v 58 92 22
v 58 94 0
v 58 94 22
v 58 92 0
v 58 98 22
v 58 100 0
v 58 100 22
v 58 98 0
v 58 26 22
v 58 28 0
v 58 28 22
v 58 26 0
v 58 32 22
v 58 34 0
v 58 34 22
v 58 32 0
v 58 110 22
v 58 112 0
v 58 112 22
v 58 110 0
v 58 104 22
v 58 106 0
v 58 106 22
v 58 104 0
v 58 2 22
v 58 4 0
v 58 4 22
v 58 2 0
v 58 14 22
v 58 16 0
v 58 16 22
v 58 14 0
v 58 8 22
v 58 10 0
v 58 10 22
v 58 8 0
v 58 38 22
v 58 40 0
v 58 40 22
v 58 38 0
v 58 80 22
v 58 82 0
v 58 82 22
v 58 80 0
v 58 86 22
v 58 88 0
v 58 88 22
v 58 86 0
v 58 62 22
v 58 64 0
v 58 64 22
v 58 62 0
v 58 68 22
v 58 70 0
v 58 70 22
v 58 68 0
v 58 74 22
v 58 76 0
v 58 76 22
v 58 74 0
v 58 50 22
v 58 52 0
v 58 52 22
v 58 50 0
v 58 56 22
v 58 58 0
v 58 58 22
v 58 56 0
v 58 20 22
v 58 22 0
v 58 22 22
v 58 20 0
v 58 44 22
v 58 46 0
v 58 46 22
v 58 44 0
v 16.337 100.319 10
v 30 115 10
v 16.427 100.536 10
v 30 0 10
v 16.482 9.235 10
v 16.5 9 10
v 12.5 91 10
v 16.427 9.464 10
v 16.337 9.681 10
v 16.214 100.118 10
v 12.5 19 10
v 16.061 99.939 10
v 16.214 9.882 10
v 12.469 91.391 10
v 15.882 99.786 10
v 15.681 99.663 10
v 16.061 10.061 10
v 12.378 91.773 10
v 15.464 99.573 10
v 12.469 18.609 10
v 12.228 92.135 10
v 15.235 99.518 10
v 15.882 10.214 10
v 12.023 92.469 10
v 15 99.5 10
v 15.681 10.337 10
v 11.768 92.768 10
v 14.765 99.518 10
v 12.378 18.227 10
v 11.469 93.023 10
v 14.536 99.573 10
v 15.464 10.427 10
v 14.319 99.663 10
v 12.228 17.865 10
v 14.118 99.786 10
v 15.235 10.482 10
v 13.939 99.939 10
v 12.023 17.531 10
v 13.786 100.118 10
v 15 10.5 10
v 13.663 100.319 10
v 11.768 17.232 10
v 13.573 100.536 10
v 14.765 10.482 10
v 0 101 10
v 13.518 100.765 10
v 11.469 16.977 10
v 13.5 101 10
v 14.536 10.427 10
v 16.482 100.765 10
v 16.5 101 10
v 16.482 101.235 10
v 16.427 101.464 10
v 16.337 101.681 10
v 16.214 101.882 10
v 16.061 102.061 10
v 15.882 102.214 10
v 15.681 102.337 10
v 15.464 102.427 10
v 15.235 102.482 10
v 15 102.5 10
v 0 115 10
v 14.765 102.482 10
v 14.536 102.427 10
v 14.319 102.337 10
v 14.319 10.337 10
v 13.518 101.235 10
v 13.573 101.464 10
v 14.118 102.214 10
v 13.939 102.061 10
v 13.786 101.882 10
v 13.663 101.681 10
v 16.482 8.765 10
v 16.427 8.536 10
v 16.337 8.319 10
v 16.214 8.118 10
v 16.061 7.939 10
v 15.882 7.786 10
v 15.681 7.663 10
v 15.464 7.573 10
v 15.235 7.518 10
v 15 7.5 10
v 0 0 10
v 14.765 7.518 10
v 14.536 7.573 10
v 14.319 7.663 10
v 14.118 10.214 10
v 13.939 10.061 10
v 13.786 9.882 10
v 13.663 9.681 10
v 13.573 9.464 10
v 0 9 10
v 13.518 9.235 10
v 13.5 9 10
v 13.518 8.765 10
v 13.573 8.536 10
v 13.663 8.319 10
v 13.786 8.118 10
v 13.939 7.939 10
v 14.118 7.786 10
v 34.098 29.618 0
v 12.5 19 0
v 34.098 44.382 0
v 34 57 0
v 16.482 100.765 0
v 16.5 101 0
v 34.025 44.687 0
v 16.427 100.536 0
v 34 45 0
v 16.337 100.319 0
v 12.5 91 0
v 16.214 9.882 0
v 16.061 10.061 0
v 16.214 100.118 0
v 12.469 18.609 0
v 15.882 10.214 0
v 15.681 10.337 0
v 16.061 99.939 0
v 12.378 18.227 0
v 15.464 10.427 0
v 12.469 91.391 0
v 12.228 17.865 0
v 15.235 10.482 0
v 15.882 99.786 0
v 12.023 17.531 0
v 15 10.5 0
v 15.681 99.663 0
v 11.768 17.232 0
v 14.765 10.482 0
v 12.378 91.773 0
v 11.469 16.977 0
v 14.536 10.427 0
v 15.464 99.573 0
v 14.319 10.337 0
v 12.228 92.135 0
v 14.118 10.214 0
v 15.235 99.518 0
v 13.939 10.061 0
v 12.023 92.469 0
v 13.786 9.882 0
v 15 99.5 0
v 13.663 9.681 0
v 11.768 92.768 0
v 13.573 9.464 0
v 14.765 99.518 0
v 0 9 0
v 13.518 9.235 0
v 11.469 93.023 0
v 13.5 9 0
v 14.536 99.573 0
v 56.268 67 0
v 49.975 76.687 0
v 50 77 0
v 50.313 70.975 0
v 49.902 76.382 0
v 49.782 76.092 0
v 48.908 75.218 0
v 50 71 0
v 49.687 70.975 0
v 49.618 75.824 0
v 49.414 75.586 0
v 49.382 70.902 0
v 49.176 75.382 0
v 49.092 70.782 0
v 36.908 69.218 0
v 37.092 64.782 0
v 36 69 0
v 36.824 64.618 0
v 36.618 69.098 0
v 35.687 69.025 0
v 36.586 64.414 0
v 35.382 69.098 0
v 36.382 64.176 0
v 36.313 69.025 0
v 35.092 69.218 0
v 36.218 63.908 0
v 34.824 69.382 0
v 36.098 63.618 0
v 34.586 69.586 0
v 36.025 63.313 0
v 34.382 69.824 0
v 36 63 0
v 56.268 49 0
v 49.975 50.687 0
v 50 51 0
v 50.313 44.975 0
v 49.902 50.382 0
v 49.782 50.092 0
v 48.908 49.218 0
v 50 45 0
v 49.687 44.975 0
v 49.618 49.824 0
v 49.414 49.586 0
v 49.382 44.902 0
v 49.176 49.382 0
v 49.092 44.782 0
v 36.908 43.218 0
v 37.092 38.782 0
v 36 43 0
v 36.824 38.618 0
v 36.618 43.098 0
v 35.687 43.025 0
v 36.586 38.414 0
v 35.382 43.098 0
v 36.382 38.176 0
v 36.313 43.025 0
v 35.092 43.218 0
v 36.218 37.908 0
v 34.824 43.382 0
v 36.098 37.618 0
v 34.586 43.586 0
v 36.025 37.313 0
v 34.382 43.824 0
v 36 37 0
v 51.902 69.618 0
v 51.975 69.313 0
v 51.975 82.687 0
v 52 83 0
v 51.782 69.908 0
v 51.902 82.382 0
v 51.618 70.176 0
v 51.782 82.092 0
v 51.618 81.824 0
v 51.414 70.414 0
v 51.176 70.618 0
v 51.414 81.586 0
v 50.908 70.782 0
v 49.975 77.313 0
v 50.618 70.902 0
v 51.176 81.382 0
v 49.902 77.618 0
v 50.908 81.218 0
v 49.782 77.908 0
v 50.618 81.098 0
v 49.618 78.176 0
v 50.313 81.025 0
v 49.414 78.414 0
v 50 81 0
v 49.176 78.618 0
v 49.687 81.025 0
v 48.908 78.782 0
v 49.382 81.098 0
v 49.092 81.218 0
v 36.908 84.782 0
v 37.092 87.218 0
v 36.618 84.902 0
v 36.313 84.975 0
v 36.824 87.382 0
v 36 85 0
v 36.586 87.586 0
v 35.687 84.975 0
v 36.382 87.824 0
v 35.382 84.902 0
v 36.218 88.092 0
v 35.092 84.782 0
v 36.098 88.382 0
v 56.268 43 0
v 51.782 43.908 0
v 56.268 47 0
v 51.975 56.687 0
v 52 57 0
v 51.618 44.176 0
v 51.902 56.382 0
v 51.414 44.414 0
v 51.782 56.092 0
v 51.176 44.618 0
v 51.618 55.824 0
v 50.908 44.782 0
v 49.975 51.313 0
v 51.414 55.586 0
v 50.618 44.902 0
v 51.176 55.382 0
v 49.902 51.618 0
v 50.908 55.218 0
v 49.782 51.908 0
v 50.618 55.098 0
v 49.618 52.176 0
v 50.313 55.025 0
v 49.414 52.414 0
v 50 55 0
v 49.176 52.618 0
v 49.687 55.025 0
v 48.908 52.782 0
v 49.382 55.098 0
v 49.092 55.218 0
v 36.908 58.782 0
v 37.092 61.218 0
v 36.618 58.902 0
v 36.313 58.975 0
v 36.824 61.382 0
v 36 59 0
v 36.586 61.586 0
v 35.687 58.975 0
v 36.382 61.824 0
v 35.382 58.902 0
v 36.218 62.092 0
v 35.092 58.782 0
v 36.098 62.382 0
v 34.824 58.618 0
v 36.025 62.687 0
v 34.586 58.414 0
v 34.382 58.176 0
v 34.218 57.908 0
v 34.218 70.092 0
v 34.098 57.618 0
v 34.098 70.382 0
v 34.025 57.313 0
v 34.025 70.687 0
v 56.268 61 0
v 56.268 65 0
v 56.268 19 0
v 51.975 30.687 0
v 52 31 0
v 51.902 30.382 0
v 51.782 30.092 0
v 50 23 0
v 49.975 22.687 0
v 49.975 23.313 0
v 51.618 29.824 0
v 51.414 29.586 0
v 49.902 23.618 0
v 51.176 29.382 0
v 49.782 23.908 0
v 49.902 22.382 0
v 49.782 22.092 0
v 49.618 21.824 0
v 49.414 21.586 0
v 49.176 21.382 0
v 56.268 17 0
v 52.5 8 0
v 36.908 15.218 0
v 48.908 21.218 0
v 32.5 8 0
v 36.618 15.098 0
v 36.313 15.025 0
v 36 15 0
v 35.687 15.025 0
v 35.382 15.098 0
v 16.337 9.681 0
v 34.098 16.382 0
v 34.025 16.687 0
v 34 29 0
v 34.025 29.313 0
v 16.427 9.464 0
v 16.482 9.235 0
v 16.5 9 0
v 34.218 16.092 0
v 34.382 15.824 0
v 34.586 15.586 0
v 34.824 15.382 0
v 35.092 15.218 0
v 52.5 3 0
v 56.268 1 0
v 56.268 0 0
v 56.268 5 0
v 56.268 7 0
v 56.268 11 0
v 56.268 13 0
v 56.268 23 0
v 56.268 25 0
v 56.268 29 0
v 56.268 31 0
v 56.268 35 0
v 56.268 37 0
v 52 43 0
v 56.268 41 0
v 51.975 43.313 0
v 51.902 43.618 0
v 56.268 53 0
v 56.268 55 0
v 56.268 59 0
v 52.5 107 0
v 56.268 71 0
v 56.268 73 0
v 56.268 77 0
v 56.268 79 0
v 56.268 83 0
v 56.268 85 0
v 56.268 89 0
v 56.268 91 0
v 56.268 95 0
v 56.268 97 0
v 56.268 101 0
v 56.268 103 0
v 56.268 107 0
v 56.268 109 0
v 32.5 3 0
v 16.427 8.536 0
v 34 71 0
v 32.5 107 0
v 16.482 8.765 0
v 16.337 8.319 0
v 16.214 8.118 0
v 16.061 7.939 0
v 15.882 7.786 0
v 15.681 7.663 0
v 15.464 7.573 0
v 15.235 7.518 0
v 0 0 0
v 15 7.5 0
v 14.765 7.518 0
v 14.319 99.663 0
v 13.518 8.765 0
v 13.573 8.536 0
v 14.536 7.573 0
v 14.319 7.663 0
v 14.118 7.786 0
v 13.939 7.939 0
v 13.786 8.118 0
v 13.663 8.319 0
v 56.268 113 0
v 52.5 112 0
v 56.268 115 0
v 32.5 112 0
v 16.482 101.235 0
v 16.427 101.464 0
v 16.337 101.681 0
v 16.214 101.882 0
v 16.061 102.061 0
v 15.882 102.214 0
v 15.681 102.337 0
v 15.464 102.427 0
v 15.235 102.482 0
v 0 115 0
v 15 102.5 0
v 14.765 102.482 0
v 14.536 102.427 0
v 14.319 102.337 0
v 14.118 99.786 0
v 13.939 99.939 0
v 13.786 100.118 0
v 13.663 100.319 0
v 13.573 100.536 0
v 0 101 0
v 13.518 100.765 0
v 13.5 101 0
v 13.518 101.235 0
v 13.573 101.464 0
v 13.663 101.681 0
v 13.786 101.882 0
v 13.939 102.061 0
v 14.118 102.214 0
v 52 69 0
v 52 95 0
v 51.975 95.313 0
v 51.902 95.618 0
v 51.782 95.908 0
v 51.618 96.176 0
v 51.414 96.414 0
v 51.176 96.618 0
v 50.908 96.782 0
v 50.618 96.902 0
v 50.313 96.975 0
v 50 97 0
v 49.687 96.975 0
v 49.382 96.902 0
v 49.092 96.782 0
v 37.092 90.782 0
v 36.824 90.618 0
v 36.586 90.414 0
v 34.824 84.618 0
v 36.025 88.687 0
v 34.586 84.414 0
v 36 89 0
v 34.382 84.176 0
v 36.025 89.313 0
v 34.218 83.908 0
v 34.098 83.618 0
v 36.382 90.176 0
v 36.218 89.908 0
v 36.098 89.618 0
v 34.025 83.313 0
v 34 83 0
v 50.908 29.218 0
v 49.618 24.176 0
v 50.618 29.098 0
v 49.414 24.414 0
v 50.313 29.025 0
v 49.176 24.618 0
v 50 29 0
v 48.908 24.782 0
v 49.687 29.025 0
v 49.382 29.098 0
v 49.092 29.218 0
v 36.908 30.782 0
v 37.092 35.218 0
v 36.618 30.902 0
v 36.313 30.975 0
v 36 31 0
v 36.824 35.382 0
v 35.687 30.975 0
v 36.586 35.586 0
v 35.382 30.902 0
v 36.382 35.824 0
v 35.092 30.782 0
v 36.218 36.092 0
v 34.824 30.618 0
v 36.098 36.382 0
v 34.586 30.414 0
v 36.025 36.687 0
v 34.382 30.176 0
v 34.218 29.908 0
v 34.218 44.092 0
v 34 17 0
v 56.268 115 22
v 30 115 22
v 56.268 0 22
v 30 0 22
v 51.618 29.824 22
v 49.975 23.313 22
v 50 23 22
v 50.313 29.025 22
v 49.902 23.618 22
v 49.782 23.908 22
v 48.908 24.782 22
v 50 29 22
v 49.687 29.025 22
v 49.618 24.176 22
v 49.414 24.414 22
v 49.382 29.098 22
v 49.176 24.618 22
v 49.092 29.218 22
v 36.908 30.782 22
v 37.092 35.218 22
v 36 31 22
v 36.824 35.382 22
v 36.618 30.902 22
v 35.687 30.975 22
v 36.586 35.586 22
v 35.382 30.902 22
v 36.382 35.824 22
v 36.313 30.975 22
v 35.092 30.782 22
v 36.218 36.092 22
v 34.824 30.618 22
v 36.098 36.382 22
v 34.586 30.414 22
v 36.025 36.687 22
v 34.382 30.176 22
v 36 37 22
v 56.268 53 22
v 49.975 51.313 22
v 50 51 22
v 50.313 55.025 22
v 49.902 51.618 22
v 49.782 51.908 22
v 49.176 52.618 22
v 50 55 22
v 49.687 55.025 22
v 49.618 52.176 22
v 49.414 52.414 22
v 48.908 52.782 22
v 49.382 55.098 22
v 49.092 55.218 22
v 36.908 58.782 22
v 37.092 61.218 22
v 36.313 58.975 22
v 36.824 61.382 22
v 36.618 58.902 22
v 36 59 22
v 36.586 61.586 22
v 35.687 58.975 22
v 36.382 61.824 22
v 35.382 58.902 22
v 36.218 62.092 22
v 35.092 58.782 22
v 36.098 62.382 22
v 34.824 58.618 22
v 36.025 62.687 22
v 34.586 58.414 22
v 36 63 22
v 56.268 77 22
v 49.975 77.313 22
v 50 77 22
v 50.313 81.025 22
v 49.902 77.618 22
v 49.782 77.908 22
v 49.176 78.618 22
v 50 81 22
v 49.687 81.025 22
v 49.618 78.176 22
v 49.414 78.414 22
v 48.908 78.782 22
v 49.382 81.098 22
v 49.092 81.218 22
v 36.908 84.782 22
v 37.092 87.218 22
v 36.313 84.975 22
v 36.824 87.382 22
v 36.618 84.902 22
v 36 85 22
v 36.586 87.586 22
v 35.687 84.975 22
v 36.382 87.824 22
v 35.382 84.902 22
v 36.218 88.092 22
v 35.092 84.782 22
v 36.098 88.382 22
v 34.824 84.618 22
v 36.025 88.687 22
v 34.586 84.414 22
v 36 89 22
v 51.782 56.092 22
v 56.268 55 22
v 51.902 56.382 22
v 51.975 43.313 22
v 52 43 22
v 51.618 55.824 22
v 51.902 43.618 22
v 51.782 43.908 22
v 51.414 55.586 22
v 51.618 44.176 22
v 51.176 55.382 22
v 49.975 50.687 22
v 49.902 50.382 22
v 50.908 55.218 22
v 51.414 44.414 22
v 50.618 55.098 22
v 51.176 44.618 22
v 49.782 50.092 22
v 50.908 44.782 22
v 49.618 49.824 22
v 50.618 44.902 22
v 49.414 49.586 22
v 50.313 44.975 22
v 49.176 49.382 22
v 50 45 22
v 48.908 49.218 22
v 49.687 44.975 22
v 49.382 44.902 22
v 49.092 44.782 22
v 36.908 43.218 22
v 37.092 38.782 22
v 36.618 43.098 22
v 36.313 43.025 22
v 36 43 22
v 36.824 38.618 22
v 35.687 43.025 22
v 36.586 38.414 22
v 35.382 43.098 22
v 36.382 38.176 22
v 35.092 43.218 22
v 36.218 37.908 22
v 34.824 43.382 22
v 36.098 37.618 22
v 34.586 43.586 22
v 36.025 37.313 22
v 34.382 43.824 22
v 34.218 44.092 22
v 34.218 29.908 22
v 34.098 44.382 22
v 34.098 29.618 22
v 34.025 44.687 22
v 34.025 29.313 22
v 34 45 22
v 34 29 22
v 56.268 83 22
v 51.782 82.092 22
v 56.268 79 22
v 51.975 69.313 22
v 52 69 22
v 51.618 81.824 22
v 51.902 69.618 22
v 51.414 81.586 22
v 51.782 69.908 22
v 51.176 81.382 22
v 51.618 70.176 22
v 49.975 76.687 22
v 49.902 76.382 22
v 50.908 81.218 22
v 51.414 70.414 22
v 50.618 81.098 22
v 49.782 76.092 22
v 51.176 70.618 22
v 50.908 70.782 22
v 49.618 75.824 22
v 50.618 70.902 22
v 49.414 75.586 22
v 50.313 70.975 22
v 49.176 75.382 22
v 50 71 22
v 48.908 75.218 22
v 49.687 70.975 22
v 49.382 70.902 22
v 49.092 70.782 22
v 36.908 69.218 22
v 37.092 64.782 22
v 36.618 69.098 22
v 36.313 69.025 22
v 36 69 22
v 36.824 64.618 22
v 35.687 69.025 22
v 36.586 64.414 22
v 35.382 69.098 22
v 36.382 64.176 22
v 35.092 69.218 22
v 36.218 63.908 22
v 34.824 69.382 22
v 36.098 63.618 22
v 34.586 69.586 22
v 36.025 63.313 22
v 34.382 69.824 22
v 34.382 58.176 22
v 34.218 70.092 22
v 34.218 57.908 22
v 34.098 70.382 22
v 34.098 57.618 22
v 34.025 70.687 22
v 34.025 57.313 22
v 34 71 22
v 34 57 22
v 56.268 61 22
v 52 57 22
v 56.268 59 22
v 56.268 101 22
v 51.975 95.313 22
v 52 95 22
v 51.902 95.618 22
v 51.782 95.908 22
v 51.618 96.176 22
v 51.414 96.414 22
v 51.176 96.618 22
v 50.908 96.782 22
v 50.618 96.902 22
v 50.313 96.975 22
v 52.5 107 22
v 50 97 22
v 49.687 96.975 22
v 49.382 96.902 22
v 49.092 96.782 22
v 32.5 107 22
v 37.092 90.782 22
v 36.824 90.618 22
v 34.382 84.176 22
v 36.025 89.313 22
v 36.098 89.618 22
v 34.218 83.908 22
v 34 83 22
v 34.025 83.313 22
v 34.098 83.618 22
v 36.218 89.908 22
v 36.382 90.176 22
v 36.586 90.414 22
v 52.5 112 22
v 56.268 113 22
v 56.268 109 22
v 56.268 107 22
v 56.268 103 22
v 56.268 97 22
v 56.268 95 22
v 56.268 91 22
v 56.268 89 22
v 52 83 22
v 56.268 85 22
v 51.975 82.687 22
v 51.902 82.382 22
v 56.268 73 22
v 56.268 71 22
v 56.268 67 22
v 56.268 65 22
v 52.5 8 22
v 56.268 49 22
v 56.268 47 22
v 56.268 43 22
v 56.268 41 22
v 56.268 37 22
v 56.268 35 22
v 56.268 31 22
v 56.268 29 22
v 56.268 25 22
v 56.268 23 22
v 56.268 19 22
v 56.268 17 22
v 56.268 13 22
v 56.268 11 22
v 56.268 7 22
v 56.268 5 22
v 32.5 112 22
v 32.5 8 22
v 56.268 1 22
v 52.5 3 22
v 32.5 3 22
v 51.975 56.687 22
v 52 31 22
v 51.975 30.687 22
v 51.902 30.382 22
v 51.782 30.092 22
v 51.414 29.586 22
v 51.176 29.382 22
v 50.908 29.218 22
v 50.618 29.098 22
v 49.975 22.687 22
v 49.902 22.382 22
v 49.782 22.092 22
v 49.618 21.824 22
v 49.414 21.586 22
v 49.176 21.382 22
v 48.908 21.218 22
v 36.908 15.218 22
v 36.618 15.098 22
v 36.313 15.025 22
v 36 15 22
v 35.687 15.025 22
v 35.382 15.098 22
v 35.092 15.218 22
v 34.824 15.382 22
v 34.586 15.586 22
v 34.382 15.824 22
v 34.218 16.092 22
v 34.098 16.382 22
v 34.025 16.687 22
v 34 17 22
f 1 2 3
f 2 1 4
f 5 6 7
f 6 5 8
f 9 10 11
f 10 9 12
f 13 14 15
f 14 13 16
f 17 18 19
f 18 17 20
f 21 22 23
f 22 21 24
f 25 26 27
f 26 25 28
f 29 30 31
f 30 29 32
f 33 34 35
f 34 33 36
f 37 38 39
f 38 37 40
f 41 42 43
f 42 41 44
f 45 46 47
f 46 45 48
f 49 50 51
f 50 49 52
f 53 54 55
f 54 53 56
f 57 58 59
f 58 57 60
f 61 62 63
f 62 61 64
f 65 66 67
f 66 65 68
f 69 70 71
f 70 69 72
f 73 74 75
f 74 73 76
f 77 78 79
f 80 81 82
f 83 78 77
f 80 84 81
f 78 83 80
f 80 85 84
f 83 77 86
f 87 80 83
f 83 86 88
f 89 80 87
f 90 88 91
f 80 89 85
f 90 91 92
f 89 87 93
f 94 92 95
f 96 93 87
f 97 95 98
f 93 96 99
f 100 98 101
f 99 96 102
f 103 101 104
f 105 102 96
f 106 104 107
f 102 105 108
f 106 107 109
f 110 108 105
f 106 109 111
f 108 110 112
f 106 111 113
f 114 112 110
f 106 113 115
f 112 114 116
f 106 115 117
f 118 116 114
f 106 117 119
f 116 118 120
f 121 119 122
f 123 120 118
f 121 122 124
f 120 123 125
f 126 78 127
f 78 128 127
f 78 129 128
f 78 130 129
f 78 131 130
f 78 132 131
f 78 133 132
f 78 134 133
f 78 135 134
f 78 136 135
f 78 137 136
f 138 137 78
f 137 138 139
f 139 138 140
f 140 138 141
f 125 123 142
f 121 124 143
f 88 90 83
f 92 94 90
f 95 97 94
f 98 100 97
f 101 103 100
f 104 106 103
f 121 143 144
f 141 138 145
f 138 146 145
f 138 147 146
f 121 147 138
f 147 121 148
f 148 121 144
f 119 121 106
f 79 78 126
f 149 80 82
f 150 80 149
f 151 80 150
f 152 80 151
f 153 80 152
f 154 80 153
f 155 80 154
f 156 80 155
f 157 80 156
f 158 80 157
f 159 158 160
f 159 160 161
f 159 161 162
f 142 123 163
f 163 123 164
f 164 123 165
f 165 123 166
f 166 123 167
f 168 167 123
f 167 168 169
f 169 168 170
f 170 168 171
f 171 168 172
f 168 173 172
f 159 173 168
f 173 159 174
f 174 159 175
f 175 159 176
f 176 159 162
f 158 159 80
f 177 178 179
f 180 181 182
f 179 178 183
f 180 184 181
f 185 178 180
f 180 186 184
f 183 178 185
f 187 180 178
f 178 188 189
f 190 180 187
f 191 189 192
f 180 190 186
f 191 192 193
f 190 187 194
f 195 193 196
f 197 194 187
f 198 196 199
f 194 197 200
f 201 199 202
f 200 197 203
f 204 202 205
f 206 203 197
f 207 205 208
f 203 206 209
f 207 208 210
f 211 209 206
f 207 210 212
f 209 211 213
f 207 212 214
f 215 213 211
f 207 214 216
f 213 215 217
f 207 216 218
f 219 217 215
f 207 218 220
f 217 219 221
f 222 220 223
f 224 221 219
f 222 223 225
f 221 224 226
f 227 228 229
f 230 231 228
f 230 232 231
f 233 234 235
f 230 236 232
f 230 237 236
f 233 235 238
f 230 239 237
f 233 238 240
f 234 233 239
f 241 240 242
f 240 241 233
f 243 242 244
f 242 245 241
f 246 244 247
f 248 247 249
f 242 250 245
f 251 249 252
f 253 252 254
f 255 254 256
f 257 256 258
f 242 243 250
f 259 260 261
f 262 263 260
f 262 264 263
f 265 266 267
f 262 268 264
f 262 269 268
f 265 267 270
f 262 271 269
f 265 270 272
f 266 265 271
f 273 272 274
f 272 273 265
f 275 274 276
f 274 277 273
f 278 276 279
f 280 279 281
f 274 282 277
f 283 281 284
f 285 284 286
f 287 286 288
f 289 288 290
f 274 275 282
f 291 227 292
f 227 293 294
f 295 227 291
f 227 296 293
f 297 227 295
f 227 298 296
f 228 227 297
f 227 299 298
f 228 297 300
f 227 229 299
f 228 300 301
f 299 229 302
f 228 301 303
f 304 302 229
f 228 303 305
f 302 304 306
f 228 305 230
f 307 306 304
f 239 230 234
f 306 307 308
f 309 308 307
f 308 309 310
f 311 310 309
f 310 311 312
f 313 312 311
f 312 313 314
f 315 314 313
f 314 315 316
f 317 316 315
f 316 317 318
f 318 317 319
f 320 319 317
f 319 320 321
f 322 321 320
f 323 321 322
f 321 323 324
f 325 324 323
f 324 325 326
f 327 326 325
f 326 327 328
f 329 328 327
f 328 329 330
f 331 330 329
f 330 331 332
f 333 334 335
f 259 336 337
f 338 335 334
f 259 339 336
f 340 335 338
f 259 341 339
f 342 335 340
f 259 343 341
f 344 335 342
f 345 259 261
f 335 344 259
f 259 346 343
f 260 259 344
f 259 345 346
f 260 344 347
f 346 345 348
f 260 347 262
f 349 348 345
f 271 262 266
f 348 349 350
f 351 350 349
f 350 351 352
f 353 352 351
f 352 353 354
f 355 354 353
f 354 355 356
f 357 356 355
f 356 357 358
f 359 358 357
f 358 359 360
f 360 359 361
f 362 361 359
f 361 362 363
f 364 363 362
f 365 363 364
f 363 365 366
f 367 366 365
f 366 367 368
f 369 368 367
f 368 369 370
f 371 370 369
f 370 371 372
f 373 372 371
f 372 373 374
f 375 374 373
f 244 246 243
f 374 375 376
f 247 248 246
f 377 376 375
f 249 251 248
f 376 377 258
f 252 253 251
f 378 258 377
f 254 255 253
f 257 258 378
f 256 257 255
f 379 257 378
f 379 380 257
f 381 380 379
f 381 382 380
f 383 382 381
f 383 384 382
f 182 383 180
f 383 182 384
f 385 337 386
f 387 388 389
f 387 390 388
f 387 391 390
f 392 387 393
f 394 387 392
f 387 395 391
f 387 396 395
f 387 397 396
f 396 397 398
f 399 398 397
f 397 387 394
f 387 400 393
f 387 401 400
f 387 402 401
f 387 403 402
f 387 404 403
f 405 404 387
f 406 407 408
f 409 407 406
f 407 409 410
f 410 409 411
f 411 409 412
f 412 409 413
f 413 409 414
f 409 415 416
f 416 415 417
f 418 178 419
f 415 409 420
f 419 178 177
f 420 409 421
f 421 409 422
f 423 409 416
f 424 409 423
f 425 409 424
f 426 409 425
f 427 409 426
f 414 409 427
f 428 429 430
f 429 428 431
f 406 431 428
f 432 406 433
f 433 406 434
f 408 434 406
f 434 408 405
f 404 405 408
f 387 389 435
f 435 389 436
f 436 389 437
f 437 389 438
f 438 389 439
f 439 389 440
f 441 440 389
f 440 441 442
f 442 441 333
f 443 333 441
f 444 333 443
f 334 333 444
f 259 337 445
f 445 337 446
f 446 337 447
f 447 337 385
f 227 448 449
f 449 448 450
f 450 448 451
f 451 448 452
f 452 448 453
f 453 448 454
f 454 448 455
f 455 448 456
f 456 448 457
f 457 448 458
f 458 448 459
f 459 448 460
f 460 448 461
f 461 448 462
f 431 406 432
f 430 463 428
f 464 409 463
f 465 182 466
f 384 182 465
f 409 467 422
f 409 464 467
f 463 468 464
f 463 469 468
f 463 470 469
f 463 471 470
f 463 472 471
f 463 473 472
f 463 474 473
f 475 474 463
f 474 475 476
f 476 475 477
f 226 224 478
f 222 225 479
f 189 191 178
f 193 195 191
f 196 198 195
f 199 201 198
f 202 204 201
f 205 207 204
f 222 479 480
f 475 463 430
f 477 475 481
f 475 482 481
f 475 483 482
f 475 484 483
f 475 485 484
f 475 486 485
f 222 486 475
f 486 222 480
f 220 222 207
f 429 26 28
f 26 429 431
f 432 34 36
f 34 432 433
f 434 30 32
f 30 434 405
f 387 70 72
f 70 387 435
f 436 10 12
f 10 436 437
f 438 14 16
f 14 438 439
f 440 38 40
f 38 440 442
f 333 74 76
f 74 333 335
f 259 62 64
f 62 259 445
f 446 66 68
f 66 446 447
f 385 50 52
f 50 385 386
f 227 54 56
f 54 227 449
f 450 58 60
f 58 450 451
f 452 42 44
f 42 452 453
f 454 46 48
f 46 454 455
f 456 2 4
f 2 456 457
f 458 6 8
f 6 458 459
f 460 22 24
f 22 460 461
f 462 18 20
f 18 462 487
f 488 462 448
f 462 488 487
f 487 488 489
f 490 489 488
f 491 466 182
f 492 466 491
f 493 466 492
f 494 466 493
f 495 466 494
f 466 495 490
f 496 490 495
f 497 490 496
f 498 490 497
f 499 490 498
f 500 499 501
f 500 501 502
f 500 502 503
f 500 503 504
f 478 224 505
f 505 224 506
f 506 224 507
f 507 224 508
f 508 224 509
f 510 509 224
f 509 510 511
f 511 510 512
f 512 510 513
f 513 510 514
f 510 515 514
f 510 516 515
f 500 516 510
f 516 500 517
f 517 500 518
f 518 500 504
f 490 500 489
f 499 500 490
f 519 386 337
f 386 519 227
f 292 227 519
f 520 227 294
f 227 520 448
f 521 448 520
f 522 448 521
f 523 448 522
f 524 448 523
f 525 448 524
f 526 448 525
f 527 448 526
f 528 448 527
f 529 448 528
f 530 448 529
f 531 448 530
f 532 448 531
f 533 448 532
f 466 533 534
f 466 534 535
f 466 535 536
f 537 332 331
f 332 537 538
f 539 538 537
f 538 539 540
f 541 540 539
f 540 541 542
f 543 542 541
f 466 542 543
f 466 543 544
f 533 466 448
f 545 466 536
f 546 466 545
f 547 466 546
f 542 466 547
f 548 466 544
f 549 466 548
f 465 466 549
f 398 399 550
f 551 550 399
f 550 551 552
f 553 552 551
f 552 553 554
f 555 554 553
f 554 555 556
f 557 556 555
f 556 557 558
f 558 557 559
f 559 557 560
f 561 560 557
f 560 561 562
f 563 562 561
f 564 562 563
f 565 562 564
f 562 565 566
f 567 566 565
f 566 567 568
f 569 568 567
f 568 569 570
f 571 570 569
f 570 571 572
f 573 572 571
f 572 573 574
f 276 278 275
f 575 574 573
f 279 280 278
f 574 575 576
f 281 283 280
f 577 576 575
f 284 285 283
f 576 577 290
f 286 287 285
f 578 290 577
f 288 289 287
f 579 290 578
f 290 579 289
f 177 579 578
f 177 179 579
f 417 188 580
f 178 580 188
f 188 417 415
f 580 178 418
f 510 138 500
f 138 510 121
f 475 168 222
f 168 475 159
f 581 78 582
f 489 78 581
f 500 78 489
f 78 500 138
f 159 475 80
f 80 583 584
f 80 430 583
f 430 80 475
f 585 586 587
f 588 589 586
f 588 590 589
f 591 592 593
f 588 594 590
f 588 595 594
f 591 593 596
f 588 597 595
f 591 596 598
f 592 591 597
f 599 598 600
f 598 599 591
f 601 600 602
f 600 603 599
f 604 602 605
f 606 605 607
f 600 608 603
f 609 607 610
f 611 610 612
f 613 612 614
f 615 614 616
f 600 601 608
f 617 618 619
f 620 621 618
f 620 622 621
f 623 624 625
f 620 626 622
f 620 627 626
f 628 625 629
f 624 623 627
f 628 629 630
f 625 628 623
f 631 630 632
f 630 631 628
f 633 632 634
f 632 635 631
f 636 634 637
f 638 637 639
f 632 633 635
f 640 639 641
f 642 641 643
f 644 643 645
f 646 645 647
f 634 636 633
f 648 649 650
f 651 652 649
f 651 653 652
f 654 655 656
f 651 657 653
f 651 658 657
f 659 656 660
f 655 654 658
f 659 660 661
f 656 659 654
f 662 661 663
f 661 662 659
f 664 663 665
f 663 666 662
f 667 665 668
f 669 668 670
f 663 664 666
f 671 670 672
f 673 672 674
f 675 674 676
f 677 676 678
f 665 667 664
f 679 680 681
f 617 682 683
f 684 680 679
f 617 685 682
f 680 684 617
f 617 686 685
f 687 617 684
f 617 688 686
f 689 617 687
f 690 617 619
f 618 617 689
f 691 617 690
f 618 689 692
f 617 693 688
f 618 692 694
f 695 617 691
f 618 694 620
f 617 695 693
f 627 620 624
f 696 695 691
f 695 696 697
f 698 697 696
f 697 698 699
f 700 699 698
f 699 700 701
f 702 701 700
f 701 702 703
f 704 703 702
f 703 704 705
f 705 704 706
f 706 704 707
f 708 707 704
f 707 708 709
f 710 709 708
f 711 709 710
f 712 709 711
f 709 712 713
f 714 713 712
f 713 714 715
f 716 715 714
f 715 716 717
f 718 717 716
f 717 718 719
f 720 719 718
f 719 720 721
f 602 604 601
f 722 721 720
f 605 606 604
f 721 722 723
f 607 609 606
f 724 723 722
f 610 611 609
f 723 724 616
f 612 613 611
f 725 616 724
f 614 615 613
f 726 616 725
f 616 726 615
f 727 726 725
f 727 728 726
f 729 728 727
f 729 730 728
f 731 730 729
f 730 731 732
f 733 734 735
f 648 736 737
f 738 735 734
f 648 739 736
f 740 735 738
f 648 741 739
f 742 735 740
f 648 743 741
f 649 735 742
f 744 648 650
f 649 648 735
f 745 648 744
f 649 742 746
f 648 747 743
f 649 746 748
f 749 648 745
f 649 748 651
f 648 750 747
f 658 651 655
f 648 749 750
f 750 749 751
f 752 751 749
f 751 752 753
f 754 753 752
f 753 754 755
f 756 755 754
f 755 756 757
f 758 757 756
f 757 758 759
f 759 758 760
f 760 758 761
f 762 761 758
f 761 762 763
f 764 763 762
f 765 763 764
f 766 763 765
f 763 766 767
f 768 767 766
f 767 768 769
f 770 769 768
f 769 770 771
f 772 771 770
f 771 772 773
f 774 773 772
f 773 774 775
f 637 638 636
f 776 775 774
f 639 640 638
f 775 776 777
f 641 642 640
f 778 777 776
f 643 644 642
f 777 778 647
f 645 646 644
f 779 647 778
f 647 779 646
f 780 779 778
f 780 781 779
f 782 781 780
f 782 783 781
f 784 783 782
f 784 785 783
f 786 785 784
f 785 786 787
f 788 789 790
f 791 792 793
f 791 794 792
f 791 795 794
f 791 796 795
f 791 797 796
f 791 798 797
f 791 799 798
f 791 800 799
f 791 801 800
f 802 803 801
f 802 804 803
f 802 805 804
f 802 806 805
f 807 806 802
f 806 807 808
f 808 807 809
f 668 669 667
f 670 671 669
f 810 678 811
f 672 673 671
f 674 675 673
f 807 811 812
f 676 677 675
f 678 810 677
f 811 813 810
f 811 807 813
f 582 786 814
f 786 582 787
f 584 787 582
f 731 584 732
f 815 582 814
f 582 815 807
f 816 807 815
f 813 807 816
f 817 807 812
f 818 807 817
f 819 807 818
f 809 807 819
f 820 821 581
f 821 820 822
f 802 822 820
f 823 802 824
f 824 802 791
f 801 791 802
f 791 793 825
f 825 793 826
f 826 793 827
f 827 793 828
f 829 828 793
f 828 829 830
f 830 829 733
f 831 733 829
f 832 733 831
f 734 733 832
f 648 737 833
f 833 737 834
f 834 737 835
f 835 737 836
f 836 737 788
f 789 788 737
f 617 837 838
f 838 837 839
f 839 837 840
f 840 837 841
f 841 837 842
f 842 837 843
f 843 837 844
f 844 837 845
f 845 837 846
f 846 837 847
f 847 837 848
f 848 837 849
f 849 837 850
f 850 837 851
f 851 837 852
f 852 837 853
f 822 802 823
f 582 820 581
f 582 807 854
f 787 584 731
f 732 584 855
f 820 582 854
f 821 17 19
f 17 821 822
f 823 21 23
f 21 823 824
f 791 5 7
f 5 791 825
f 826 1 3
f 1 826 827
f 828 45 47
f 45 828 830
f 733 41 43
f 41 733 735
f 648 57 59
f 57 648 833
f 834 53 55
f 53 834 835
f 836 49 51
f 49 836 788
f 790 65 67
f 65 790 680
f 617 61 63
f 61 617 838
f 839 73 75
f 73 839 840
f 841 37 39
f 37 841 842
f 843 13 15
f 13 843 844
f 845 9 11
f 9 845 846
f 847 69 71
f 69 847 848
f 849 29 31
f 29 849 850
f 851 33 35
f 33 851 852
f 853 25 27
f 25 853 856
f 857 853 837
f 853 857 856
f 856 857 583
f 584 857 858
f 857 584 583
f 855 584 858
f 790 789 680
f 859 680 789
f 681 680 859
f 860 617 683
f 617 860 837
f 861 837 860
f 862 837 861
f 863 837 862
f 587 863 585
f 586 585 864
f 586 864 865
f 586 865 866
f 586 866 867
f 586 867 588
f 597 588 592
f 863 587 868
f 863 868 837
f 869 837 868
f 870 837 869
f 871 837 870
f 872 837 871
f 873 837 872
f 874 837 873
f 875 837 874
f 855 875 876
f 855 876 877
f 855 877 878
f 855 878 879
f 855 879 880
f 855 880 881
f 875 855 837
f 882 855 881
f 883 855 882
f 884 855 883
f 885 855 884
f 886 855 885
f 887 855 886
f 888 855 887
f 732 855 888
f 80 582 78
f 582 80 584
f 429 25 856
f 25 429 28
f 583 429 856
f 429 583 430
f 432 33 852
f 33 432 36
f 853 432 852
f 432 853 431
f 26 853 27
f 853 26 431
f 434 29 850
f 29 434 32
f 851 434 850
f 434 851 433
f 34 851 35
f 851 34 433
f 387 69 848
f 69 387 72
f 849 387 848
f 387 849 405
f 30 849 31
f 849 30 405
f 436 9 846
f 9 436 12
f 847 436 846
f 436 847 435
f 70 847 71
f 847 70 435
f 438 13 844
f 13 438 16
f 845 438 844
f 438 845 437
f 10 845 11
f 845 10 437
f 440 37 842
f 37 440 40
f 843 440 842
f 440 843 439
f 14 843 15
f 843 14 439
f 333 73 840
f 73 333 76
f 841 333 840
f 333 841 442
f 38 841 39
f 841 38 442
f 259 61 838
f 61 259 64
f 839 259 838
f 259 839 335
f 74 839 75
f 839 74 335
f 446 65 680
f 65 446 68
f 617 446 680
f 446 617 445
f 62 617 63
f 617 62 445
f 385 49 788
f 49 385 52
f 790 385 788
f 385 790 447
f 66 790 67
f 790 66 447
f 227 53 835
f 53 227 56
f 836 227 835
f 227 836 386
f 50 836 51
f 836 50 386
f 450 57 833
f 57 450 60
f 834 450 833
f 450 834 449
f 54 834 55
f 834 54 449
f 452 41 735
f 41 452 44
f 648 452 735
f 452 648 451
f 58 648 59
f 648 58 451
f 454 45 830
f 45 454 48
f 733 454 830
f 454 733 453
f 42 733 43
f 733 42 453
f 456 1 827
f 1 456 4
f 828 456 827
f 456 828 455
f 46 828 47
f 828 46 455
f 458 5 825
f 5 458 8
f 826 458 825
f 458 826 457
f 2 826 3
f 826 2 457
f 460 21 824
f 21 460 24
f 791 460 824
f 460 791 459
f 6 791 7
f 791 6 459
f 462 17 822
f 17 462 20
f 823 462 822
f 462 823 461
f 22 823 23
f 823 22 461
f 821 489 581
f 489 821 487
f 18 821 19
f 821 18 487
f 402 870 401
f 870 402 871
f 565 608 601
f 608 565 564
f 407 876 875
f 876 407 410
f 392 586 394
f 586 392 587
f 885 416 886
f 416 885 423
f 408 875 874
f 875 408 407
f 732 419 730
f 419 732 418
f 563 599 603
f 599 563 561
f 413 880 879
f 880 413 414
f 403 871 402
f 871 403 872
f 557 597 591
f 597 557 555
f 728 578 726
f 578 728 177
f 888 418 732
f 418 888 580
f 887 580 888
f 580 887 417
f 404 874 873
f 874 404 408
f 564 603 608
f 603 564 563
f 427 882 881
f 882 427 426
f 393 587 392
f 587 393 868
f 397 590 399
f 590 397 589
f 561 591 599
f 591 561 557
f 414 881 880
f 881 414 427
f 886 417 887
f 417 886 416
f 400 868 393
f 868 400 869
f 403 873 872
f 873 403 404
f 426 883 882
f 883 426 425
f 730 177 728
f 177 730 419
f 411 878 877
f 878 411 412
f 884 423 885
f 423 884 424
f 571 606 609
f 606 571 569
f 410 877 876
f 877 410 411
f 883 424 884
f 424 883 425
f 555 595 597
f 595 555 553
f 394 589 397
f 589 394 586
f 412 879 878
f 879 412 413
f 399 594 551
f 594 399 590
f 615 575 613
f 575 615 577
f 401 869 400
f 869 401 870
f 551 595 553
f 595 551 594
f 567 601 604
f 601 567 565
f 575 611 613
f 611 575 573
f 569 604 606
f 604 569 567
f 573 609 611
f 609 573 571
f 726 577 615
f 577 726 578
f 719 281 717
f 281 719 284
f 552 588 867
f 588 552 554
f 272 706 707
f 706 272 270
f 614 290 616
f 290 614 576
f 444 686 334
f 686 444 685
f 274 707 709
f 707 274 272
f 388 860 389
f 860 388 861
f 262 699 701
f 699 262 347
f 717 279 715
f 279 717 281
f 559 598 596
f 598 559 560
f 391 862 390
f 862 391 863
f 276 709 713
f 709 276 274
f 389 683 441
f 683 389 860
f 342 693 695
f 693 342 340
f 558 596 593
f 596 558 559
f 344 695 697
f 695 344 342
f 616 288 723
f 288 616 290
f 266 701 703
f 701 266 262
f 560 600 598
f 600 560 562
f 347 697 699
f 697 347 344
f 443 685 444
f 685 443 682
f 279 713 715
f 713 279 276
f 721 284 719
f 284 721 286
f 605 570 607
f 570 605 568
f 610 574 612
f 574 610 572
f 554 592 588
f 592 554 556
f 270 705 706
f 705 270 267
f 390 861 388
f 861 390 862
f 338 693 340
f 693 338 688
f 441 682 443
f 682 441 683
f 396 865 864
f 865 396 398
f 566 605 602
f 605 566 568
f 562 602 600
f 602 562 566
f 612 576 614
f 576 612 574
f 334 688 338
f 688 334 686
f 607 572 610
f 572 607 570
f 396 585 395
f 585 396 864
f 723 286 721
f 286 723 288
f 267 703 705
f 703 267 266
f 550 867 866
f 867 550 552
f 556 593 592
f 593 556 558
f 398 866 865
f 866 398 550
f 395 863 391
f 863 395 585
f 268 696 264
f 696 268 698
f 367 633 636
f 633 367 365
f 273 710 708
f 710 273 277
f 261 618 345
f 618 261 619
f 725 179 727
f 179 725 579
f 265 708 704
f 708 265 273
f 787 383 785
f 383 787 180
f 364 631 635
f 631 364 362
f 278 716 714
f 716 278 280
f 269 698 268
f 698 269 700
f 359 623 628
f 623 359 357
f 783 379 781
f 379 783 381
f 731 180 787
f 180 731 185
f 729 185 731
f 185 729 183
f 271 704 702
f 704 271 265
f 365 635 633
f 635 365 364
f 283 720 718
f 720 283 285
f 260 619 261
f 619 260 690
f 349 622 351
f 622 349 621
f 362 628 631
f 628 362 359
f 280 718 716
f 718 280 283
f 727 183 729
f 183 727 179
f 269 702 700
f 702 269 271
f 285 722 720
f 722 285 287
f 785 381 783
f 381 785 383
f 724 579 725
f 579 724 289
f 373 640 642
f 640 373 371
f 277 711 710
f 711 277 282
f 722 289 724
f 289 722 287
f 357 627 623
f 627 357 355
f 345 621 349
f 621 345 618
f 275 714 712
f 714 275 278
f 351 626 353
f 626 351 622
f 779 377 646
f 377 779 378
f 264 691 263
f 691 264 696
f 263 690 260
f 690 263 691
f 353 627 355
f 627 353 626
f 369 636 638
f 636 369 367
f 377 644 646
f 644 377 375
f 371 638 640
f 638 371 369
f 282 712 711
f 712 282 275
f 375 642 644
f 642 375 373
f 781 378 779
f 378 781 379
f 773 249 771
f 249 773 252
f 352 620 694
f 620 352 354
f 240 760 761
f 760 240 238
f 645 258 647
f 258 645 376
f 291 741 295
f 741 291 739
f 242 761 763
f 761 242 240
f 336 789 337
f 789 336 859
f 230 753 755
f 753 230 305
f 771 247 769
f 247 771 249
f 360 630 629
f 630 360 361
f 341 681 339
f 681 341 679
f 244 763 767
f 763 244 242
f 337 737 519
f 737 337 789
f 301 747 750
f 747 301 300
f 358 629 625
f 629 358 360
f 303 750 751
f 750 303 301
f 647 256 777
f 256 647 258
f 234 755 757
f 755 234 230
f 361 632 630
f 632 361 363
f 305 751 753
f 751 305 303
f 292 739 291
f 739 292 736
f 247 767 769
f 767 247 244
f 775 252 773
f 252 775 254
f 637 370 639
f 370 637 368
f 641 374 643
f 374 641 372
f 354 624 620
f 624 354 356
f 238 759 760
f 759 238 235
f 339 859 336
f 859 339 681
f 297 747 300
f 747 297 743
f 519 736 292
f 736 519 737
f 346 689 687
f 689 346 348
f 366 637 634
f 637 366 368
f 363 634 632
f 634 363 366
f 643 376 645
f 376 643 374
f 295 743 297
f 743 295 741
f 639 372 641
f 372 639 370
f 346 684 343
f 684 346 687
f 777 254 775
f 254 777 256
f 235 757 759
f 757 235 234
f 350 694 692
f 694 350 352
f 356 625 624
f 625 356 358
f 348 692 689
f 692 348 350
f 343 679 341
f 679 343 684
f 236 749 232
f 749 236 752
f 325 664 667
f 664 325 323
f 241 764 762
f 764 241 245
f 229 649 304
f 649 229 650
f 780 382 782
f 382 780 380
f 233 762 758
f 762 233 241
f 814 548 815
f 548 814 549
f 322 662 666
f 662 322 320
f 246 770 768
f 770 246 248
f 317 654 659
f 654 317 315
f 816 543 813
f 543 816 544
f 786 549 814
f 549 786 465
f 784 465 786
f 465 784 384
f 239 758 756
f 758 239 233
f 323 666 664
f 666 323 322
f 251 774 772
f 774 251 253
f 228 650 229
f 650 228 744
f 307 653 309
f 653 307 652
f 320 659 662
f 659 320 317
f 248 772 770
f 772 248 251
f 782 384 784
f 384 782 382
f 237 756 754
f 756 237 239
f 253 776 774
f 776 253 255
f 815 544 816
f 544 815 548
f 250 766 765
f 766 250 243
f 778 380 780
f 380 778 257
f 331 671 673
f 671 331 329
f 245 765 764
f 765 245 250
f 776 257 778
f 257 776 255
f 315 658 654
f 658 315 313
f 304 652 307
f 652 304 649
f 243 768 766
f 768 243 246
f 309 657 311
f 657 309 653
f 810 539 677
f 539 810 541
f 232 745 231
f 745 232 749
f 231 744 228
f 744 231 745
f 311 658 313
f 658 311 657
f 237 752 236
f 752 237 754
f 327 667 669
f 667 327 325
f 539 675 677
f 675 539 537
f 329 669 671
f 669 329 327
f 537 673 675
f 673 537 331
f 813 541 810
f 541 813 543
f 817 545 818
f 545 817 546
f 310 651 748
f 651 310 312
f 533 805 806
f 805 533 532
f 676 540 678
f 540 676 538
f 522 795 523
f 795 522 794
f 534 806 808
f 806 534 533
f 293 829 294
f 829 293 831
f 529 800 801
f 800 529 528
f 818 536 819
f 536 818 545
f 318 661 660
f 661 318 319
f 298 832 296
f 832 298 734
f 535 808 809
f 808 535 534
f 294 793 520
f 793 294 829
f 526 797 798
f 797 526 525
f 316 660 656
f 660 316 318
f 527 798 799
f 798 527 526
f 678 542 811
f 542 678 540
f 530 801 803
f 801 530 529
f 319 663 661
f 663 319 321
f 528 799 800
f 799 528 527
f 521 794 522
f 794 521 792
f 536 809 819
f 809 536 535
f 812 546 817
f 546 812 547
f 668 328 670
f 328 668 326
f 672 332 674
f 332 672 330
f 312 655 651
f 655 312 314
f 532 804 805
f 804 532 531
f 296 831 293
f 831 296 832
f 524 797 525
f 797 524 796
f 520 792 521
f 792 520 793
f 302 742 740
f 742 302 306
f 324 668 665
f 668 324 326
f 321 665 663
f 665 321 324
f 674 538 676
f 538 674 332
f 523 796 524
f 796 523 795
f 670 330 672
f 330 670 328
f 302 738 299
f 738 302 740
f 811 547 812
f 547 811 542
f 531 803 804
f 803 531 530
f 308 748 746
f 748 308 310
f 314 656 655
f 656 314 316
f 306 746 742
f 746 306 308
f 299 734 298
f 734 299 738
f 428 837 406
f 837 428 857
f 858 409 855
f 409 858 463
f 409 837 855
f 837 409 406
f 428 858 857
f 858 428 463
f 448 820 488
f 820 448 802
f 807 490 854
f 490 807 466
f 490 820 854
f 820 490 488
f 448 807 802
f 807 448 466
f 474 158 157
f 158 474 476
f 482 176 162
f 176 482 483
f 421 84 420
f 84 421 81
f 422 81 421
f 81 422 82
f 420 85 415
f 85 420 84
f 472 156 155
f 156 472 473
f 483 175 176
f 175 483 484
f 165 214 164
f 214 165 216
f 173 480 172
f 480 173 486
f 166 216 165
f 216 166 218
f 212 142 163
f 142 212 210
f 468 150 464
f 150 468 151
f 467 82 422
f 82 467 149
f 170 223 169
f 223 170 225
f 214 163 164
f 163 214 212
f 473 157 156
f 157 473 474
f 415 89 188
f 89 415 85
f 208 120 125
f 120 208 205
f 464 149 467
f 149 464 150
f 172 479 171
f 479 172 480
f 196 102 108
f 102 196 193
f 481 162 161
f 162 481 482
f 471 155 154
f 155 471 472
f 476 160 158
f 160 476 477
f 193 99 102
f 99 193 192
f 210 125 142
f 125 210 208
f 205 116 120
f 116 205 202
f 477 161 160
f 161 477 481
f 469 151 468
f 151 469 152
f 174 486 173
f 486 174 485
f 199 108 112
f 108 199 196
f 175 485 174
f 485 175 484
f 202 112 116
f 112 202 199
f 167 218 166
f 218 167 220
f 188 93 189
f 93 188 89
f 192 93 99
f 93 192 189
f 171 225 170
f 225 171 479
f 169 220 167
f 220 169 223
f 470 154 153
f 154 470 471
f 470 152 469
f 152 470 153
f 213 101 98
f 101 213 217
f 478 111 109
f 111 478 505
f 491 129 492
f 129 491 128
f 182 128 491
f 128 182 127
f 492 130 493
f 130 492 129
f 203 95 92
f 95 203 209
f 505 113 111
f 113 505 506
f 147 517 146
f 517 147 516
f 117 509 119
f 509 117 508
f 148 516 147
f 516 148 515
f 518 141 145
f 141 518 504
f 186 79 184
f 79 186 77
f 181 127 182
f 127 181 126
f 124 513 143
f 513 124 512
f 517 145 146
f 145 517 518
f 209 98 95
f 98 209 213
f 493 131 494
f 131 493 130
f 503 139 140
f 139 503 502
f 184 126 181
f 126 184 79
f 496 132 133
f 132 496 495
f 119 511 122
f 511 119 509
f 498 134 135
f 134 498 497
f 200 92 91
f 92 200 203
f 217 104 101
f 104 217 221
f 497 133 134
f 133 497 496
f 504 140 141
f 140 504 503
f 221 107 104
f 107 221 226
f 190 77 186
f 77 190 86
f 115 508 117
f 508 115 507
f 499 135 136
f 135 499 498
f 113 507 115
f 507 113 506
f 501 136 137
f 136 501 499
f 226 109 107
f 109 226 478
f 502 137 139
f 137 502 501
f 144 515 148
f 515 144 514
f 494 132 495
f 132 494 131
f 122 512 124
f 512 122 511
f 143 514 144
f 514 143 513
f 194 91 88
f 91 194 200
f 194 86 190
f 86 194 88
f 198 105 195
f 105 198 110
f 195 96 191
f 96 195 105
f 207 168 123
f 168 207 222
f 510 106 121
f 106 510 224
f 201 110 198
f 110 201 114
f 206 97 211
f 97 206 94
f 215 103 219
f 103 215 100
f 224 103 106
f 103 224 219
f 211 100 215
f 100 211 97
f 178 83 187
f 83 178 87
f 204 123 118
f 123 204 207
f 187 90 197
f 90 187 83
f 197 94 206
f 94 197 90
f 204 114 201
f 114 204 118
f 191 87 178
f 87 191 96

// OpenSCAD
totThk=22;
botThk=10;
ht=115;
len=58;
buttLen=28;
strapLen=20;
strapHt = 5;

holeOffX=15;
holeOffY=9;
holeGap=92;

$fn=40;

difference() {
   union() {
      cube([len,ht,botThk]);
      translate([len-buttLen,0,0]) cube([buttLen,ht,totThk]);
   }


   translate([len-buttLen+2.5,3,-1]) cube([strapLen,strapHt,totThk+2]);
   translate([len-buttLen+2.5,ht-3-strapHt,-1])
      cube([strapLen,strapHt,totThk+2]);
   for(i=[0:19]) {
      translate([len,i*6,-1]) rotate([0,0,30]) cylinder($fn=6,r=2,h=totThk+2);
   }

   translate([holeOffX,holeOffY,-1]) cylinder(d=3,h=totThk);
   translate([holeOffX,holeOffY+holeGap,-1]) cylinder(d=3,h=totThk);

   hull() {
      translate([holeOffX-5,holeOffY+10,-1]) cylinder(d=5,h=totThk+2);
      translate([holeOffX-5,holeOffY+holeGap-10,-1]) cylinder(d=5,h=totThk+2);
      translate([-1,holeOffY,-1]) cube([1,holeGap,totThk+2]);
   }

   translate([len-buttLen+12,3,0]) triCutouts();

}

module triCutouts() {
   translate([2,14,-1]) triCutout();
   translate([0,40,-1]) rotate([0,0,180]) triCutout();
   translate([2,42,-1]) triCutout();
   translate([0,66,-1]) rotate([0,0,180]) triCutout();
   translate([2,42+26,-1]) triCutout();
   translate([0,92,-1]) rotate([0,0,180]) triCutout();
}

module triCutout() {
   translate([-8,0,0]) hull() {
      cylinder(d=4,h=totThk+2);
      translate([0,12,0]) cylinder(d=4,h=totThk+2);
      translate([12,6,0]) cylinder(d=4,h=totThk+2);
   }
}
